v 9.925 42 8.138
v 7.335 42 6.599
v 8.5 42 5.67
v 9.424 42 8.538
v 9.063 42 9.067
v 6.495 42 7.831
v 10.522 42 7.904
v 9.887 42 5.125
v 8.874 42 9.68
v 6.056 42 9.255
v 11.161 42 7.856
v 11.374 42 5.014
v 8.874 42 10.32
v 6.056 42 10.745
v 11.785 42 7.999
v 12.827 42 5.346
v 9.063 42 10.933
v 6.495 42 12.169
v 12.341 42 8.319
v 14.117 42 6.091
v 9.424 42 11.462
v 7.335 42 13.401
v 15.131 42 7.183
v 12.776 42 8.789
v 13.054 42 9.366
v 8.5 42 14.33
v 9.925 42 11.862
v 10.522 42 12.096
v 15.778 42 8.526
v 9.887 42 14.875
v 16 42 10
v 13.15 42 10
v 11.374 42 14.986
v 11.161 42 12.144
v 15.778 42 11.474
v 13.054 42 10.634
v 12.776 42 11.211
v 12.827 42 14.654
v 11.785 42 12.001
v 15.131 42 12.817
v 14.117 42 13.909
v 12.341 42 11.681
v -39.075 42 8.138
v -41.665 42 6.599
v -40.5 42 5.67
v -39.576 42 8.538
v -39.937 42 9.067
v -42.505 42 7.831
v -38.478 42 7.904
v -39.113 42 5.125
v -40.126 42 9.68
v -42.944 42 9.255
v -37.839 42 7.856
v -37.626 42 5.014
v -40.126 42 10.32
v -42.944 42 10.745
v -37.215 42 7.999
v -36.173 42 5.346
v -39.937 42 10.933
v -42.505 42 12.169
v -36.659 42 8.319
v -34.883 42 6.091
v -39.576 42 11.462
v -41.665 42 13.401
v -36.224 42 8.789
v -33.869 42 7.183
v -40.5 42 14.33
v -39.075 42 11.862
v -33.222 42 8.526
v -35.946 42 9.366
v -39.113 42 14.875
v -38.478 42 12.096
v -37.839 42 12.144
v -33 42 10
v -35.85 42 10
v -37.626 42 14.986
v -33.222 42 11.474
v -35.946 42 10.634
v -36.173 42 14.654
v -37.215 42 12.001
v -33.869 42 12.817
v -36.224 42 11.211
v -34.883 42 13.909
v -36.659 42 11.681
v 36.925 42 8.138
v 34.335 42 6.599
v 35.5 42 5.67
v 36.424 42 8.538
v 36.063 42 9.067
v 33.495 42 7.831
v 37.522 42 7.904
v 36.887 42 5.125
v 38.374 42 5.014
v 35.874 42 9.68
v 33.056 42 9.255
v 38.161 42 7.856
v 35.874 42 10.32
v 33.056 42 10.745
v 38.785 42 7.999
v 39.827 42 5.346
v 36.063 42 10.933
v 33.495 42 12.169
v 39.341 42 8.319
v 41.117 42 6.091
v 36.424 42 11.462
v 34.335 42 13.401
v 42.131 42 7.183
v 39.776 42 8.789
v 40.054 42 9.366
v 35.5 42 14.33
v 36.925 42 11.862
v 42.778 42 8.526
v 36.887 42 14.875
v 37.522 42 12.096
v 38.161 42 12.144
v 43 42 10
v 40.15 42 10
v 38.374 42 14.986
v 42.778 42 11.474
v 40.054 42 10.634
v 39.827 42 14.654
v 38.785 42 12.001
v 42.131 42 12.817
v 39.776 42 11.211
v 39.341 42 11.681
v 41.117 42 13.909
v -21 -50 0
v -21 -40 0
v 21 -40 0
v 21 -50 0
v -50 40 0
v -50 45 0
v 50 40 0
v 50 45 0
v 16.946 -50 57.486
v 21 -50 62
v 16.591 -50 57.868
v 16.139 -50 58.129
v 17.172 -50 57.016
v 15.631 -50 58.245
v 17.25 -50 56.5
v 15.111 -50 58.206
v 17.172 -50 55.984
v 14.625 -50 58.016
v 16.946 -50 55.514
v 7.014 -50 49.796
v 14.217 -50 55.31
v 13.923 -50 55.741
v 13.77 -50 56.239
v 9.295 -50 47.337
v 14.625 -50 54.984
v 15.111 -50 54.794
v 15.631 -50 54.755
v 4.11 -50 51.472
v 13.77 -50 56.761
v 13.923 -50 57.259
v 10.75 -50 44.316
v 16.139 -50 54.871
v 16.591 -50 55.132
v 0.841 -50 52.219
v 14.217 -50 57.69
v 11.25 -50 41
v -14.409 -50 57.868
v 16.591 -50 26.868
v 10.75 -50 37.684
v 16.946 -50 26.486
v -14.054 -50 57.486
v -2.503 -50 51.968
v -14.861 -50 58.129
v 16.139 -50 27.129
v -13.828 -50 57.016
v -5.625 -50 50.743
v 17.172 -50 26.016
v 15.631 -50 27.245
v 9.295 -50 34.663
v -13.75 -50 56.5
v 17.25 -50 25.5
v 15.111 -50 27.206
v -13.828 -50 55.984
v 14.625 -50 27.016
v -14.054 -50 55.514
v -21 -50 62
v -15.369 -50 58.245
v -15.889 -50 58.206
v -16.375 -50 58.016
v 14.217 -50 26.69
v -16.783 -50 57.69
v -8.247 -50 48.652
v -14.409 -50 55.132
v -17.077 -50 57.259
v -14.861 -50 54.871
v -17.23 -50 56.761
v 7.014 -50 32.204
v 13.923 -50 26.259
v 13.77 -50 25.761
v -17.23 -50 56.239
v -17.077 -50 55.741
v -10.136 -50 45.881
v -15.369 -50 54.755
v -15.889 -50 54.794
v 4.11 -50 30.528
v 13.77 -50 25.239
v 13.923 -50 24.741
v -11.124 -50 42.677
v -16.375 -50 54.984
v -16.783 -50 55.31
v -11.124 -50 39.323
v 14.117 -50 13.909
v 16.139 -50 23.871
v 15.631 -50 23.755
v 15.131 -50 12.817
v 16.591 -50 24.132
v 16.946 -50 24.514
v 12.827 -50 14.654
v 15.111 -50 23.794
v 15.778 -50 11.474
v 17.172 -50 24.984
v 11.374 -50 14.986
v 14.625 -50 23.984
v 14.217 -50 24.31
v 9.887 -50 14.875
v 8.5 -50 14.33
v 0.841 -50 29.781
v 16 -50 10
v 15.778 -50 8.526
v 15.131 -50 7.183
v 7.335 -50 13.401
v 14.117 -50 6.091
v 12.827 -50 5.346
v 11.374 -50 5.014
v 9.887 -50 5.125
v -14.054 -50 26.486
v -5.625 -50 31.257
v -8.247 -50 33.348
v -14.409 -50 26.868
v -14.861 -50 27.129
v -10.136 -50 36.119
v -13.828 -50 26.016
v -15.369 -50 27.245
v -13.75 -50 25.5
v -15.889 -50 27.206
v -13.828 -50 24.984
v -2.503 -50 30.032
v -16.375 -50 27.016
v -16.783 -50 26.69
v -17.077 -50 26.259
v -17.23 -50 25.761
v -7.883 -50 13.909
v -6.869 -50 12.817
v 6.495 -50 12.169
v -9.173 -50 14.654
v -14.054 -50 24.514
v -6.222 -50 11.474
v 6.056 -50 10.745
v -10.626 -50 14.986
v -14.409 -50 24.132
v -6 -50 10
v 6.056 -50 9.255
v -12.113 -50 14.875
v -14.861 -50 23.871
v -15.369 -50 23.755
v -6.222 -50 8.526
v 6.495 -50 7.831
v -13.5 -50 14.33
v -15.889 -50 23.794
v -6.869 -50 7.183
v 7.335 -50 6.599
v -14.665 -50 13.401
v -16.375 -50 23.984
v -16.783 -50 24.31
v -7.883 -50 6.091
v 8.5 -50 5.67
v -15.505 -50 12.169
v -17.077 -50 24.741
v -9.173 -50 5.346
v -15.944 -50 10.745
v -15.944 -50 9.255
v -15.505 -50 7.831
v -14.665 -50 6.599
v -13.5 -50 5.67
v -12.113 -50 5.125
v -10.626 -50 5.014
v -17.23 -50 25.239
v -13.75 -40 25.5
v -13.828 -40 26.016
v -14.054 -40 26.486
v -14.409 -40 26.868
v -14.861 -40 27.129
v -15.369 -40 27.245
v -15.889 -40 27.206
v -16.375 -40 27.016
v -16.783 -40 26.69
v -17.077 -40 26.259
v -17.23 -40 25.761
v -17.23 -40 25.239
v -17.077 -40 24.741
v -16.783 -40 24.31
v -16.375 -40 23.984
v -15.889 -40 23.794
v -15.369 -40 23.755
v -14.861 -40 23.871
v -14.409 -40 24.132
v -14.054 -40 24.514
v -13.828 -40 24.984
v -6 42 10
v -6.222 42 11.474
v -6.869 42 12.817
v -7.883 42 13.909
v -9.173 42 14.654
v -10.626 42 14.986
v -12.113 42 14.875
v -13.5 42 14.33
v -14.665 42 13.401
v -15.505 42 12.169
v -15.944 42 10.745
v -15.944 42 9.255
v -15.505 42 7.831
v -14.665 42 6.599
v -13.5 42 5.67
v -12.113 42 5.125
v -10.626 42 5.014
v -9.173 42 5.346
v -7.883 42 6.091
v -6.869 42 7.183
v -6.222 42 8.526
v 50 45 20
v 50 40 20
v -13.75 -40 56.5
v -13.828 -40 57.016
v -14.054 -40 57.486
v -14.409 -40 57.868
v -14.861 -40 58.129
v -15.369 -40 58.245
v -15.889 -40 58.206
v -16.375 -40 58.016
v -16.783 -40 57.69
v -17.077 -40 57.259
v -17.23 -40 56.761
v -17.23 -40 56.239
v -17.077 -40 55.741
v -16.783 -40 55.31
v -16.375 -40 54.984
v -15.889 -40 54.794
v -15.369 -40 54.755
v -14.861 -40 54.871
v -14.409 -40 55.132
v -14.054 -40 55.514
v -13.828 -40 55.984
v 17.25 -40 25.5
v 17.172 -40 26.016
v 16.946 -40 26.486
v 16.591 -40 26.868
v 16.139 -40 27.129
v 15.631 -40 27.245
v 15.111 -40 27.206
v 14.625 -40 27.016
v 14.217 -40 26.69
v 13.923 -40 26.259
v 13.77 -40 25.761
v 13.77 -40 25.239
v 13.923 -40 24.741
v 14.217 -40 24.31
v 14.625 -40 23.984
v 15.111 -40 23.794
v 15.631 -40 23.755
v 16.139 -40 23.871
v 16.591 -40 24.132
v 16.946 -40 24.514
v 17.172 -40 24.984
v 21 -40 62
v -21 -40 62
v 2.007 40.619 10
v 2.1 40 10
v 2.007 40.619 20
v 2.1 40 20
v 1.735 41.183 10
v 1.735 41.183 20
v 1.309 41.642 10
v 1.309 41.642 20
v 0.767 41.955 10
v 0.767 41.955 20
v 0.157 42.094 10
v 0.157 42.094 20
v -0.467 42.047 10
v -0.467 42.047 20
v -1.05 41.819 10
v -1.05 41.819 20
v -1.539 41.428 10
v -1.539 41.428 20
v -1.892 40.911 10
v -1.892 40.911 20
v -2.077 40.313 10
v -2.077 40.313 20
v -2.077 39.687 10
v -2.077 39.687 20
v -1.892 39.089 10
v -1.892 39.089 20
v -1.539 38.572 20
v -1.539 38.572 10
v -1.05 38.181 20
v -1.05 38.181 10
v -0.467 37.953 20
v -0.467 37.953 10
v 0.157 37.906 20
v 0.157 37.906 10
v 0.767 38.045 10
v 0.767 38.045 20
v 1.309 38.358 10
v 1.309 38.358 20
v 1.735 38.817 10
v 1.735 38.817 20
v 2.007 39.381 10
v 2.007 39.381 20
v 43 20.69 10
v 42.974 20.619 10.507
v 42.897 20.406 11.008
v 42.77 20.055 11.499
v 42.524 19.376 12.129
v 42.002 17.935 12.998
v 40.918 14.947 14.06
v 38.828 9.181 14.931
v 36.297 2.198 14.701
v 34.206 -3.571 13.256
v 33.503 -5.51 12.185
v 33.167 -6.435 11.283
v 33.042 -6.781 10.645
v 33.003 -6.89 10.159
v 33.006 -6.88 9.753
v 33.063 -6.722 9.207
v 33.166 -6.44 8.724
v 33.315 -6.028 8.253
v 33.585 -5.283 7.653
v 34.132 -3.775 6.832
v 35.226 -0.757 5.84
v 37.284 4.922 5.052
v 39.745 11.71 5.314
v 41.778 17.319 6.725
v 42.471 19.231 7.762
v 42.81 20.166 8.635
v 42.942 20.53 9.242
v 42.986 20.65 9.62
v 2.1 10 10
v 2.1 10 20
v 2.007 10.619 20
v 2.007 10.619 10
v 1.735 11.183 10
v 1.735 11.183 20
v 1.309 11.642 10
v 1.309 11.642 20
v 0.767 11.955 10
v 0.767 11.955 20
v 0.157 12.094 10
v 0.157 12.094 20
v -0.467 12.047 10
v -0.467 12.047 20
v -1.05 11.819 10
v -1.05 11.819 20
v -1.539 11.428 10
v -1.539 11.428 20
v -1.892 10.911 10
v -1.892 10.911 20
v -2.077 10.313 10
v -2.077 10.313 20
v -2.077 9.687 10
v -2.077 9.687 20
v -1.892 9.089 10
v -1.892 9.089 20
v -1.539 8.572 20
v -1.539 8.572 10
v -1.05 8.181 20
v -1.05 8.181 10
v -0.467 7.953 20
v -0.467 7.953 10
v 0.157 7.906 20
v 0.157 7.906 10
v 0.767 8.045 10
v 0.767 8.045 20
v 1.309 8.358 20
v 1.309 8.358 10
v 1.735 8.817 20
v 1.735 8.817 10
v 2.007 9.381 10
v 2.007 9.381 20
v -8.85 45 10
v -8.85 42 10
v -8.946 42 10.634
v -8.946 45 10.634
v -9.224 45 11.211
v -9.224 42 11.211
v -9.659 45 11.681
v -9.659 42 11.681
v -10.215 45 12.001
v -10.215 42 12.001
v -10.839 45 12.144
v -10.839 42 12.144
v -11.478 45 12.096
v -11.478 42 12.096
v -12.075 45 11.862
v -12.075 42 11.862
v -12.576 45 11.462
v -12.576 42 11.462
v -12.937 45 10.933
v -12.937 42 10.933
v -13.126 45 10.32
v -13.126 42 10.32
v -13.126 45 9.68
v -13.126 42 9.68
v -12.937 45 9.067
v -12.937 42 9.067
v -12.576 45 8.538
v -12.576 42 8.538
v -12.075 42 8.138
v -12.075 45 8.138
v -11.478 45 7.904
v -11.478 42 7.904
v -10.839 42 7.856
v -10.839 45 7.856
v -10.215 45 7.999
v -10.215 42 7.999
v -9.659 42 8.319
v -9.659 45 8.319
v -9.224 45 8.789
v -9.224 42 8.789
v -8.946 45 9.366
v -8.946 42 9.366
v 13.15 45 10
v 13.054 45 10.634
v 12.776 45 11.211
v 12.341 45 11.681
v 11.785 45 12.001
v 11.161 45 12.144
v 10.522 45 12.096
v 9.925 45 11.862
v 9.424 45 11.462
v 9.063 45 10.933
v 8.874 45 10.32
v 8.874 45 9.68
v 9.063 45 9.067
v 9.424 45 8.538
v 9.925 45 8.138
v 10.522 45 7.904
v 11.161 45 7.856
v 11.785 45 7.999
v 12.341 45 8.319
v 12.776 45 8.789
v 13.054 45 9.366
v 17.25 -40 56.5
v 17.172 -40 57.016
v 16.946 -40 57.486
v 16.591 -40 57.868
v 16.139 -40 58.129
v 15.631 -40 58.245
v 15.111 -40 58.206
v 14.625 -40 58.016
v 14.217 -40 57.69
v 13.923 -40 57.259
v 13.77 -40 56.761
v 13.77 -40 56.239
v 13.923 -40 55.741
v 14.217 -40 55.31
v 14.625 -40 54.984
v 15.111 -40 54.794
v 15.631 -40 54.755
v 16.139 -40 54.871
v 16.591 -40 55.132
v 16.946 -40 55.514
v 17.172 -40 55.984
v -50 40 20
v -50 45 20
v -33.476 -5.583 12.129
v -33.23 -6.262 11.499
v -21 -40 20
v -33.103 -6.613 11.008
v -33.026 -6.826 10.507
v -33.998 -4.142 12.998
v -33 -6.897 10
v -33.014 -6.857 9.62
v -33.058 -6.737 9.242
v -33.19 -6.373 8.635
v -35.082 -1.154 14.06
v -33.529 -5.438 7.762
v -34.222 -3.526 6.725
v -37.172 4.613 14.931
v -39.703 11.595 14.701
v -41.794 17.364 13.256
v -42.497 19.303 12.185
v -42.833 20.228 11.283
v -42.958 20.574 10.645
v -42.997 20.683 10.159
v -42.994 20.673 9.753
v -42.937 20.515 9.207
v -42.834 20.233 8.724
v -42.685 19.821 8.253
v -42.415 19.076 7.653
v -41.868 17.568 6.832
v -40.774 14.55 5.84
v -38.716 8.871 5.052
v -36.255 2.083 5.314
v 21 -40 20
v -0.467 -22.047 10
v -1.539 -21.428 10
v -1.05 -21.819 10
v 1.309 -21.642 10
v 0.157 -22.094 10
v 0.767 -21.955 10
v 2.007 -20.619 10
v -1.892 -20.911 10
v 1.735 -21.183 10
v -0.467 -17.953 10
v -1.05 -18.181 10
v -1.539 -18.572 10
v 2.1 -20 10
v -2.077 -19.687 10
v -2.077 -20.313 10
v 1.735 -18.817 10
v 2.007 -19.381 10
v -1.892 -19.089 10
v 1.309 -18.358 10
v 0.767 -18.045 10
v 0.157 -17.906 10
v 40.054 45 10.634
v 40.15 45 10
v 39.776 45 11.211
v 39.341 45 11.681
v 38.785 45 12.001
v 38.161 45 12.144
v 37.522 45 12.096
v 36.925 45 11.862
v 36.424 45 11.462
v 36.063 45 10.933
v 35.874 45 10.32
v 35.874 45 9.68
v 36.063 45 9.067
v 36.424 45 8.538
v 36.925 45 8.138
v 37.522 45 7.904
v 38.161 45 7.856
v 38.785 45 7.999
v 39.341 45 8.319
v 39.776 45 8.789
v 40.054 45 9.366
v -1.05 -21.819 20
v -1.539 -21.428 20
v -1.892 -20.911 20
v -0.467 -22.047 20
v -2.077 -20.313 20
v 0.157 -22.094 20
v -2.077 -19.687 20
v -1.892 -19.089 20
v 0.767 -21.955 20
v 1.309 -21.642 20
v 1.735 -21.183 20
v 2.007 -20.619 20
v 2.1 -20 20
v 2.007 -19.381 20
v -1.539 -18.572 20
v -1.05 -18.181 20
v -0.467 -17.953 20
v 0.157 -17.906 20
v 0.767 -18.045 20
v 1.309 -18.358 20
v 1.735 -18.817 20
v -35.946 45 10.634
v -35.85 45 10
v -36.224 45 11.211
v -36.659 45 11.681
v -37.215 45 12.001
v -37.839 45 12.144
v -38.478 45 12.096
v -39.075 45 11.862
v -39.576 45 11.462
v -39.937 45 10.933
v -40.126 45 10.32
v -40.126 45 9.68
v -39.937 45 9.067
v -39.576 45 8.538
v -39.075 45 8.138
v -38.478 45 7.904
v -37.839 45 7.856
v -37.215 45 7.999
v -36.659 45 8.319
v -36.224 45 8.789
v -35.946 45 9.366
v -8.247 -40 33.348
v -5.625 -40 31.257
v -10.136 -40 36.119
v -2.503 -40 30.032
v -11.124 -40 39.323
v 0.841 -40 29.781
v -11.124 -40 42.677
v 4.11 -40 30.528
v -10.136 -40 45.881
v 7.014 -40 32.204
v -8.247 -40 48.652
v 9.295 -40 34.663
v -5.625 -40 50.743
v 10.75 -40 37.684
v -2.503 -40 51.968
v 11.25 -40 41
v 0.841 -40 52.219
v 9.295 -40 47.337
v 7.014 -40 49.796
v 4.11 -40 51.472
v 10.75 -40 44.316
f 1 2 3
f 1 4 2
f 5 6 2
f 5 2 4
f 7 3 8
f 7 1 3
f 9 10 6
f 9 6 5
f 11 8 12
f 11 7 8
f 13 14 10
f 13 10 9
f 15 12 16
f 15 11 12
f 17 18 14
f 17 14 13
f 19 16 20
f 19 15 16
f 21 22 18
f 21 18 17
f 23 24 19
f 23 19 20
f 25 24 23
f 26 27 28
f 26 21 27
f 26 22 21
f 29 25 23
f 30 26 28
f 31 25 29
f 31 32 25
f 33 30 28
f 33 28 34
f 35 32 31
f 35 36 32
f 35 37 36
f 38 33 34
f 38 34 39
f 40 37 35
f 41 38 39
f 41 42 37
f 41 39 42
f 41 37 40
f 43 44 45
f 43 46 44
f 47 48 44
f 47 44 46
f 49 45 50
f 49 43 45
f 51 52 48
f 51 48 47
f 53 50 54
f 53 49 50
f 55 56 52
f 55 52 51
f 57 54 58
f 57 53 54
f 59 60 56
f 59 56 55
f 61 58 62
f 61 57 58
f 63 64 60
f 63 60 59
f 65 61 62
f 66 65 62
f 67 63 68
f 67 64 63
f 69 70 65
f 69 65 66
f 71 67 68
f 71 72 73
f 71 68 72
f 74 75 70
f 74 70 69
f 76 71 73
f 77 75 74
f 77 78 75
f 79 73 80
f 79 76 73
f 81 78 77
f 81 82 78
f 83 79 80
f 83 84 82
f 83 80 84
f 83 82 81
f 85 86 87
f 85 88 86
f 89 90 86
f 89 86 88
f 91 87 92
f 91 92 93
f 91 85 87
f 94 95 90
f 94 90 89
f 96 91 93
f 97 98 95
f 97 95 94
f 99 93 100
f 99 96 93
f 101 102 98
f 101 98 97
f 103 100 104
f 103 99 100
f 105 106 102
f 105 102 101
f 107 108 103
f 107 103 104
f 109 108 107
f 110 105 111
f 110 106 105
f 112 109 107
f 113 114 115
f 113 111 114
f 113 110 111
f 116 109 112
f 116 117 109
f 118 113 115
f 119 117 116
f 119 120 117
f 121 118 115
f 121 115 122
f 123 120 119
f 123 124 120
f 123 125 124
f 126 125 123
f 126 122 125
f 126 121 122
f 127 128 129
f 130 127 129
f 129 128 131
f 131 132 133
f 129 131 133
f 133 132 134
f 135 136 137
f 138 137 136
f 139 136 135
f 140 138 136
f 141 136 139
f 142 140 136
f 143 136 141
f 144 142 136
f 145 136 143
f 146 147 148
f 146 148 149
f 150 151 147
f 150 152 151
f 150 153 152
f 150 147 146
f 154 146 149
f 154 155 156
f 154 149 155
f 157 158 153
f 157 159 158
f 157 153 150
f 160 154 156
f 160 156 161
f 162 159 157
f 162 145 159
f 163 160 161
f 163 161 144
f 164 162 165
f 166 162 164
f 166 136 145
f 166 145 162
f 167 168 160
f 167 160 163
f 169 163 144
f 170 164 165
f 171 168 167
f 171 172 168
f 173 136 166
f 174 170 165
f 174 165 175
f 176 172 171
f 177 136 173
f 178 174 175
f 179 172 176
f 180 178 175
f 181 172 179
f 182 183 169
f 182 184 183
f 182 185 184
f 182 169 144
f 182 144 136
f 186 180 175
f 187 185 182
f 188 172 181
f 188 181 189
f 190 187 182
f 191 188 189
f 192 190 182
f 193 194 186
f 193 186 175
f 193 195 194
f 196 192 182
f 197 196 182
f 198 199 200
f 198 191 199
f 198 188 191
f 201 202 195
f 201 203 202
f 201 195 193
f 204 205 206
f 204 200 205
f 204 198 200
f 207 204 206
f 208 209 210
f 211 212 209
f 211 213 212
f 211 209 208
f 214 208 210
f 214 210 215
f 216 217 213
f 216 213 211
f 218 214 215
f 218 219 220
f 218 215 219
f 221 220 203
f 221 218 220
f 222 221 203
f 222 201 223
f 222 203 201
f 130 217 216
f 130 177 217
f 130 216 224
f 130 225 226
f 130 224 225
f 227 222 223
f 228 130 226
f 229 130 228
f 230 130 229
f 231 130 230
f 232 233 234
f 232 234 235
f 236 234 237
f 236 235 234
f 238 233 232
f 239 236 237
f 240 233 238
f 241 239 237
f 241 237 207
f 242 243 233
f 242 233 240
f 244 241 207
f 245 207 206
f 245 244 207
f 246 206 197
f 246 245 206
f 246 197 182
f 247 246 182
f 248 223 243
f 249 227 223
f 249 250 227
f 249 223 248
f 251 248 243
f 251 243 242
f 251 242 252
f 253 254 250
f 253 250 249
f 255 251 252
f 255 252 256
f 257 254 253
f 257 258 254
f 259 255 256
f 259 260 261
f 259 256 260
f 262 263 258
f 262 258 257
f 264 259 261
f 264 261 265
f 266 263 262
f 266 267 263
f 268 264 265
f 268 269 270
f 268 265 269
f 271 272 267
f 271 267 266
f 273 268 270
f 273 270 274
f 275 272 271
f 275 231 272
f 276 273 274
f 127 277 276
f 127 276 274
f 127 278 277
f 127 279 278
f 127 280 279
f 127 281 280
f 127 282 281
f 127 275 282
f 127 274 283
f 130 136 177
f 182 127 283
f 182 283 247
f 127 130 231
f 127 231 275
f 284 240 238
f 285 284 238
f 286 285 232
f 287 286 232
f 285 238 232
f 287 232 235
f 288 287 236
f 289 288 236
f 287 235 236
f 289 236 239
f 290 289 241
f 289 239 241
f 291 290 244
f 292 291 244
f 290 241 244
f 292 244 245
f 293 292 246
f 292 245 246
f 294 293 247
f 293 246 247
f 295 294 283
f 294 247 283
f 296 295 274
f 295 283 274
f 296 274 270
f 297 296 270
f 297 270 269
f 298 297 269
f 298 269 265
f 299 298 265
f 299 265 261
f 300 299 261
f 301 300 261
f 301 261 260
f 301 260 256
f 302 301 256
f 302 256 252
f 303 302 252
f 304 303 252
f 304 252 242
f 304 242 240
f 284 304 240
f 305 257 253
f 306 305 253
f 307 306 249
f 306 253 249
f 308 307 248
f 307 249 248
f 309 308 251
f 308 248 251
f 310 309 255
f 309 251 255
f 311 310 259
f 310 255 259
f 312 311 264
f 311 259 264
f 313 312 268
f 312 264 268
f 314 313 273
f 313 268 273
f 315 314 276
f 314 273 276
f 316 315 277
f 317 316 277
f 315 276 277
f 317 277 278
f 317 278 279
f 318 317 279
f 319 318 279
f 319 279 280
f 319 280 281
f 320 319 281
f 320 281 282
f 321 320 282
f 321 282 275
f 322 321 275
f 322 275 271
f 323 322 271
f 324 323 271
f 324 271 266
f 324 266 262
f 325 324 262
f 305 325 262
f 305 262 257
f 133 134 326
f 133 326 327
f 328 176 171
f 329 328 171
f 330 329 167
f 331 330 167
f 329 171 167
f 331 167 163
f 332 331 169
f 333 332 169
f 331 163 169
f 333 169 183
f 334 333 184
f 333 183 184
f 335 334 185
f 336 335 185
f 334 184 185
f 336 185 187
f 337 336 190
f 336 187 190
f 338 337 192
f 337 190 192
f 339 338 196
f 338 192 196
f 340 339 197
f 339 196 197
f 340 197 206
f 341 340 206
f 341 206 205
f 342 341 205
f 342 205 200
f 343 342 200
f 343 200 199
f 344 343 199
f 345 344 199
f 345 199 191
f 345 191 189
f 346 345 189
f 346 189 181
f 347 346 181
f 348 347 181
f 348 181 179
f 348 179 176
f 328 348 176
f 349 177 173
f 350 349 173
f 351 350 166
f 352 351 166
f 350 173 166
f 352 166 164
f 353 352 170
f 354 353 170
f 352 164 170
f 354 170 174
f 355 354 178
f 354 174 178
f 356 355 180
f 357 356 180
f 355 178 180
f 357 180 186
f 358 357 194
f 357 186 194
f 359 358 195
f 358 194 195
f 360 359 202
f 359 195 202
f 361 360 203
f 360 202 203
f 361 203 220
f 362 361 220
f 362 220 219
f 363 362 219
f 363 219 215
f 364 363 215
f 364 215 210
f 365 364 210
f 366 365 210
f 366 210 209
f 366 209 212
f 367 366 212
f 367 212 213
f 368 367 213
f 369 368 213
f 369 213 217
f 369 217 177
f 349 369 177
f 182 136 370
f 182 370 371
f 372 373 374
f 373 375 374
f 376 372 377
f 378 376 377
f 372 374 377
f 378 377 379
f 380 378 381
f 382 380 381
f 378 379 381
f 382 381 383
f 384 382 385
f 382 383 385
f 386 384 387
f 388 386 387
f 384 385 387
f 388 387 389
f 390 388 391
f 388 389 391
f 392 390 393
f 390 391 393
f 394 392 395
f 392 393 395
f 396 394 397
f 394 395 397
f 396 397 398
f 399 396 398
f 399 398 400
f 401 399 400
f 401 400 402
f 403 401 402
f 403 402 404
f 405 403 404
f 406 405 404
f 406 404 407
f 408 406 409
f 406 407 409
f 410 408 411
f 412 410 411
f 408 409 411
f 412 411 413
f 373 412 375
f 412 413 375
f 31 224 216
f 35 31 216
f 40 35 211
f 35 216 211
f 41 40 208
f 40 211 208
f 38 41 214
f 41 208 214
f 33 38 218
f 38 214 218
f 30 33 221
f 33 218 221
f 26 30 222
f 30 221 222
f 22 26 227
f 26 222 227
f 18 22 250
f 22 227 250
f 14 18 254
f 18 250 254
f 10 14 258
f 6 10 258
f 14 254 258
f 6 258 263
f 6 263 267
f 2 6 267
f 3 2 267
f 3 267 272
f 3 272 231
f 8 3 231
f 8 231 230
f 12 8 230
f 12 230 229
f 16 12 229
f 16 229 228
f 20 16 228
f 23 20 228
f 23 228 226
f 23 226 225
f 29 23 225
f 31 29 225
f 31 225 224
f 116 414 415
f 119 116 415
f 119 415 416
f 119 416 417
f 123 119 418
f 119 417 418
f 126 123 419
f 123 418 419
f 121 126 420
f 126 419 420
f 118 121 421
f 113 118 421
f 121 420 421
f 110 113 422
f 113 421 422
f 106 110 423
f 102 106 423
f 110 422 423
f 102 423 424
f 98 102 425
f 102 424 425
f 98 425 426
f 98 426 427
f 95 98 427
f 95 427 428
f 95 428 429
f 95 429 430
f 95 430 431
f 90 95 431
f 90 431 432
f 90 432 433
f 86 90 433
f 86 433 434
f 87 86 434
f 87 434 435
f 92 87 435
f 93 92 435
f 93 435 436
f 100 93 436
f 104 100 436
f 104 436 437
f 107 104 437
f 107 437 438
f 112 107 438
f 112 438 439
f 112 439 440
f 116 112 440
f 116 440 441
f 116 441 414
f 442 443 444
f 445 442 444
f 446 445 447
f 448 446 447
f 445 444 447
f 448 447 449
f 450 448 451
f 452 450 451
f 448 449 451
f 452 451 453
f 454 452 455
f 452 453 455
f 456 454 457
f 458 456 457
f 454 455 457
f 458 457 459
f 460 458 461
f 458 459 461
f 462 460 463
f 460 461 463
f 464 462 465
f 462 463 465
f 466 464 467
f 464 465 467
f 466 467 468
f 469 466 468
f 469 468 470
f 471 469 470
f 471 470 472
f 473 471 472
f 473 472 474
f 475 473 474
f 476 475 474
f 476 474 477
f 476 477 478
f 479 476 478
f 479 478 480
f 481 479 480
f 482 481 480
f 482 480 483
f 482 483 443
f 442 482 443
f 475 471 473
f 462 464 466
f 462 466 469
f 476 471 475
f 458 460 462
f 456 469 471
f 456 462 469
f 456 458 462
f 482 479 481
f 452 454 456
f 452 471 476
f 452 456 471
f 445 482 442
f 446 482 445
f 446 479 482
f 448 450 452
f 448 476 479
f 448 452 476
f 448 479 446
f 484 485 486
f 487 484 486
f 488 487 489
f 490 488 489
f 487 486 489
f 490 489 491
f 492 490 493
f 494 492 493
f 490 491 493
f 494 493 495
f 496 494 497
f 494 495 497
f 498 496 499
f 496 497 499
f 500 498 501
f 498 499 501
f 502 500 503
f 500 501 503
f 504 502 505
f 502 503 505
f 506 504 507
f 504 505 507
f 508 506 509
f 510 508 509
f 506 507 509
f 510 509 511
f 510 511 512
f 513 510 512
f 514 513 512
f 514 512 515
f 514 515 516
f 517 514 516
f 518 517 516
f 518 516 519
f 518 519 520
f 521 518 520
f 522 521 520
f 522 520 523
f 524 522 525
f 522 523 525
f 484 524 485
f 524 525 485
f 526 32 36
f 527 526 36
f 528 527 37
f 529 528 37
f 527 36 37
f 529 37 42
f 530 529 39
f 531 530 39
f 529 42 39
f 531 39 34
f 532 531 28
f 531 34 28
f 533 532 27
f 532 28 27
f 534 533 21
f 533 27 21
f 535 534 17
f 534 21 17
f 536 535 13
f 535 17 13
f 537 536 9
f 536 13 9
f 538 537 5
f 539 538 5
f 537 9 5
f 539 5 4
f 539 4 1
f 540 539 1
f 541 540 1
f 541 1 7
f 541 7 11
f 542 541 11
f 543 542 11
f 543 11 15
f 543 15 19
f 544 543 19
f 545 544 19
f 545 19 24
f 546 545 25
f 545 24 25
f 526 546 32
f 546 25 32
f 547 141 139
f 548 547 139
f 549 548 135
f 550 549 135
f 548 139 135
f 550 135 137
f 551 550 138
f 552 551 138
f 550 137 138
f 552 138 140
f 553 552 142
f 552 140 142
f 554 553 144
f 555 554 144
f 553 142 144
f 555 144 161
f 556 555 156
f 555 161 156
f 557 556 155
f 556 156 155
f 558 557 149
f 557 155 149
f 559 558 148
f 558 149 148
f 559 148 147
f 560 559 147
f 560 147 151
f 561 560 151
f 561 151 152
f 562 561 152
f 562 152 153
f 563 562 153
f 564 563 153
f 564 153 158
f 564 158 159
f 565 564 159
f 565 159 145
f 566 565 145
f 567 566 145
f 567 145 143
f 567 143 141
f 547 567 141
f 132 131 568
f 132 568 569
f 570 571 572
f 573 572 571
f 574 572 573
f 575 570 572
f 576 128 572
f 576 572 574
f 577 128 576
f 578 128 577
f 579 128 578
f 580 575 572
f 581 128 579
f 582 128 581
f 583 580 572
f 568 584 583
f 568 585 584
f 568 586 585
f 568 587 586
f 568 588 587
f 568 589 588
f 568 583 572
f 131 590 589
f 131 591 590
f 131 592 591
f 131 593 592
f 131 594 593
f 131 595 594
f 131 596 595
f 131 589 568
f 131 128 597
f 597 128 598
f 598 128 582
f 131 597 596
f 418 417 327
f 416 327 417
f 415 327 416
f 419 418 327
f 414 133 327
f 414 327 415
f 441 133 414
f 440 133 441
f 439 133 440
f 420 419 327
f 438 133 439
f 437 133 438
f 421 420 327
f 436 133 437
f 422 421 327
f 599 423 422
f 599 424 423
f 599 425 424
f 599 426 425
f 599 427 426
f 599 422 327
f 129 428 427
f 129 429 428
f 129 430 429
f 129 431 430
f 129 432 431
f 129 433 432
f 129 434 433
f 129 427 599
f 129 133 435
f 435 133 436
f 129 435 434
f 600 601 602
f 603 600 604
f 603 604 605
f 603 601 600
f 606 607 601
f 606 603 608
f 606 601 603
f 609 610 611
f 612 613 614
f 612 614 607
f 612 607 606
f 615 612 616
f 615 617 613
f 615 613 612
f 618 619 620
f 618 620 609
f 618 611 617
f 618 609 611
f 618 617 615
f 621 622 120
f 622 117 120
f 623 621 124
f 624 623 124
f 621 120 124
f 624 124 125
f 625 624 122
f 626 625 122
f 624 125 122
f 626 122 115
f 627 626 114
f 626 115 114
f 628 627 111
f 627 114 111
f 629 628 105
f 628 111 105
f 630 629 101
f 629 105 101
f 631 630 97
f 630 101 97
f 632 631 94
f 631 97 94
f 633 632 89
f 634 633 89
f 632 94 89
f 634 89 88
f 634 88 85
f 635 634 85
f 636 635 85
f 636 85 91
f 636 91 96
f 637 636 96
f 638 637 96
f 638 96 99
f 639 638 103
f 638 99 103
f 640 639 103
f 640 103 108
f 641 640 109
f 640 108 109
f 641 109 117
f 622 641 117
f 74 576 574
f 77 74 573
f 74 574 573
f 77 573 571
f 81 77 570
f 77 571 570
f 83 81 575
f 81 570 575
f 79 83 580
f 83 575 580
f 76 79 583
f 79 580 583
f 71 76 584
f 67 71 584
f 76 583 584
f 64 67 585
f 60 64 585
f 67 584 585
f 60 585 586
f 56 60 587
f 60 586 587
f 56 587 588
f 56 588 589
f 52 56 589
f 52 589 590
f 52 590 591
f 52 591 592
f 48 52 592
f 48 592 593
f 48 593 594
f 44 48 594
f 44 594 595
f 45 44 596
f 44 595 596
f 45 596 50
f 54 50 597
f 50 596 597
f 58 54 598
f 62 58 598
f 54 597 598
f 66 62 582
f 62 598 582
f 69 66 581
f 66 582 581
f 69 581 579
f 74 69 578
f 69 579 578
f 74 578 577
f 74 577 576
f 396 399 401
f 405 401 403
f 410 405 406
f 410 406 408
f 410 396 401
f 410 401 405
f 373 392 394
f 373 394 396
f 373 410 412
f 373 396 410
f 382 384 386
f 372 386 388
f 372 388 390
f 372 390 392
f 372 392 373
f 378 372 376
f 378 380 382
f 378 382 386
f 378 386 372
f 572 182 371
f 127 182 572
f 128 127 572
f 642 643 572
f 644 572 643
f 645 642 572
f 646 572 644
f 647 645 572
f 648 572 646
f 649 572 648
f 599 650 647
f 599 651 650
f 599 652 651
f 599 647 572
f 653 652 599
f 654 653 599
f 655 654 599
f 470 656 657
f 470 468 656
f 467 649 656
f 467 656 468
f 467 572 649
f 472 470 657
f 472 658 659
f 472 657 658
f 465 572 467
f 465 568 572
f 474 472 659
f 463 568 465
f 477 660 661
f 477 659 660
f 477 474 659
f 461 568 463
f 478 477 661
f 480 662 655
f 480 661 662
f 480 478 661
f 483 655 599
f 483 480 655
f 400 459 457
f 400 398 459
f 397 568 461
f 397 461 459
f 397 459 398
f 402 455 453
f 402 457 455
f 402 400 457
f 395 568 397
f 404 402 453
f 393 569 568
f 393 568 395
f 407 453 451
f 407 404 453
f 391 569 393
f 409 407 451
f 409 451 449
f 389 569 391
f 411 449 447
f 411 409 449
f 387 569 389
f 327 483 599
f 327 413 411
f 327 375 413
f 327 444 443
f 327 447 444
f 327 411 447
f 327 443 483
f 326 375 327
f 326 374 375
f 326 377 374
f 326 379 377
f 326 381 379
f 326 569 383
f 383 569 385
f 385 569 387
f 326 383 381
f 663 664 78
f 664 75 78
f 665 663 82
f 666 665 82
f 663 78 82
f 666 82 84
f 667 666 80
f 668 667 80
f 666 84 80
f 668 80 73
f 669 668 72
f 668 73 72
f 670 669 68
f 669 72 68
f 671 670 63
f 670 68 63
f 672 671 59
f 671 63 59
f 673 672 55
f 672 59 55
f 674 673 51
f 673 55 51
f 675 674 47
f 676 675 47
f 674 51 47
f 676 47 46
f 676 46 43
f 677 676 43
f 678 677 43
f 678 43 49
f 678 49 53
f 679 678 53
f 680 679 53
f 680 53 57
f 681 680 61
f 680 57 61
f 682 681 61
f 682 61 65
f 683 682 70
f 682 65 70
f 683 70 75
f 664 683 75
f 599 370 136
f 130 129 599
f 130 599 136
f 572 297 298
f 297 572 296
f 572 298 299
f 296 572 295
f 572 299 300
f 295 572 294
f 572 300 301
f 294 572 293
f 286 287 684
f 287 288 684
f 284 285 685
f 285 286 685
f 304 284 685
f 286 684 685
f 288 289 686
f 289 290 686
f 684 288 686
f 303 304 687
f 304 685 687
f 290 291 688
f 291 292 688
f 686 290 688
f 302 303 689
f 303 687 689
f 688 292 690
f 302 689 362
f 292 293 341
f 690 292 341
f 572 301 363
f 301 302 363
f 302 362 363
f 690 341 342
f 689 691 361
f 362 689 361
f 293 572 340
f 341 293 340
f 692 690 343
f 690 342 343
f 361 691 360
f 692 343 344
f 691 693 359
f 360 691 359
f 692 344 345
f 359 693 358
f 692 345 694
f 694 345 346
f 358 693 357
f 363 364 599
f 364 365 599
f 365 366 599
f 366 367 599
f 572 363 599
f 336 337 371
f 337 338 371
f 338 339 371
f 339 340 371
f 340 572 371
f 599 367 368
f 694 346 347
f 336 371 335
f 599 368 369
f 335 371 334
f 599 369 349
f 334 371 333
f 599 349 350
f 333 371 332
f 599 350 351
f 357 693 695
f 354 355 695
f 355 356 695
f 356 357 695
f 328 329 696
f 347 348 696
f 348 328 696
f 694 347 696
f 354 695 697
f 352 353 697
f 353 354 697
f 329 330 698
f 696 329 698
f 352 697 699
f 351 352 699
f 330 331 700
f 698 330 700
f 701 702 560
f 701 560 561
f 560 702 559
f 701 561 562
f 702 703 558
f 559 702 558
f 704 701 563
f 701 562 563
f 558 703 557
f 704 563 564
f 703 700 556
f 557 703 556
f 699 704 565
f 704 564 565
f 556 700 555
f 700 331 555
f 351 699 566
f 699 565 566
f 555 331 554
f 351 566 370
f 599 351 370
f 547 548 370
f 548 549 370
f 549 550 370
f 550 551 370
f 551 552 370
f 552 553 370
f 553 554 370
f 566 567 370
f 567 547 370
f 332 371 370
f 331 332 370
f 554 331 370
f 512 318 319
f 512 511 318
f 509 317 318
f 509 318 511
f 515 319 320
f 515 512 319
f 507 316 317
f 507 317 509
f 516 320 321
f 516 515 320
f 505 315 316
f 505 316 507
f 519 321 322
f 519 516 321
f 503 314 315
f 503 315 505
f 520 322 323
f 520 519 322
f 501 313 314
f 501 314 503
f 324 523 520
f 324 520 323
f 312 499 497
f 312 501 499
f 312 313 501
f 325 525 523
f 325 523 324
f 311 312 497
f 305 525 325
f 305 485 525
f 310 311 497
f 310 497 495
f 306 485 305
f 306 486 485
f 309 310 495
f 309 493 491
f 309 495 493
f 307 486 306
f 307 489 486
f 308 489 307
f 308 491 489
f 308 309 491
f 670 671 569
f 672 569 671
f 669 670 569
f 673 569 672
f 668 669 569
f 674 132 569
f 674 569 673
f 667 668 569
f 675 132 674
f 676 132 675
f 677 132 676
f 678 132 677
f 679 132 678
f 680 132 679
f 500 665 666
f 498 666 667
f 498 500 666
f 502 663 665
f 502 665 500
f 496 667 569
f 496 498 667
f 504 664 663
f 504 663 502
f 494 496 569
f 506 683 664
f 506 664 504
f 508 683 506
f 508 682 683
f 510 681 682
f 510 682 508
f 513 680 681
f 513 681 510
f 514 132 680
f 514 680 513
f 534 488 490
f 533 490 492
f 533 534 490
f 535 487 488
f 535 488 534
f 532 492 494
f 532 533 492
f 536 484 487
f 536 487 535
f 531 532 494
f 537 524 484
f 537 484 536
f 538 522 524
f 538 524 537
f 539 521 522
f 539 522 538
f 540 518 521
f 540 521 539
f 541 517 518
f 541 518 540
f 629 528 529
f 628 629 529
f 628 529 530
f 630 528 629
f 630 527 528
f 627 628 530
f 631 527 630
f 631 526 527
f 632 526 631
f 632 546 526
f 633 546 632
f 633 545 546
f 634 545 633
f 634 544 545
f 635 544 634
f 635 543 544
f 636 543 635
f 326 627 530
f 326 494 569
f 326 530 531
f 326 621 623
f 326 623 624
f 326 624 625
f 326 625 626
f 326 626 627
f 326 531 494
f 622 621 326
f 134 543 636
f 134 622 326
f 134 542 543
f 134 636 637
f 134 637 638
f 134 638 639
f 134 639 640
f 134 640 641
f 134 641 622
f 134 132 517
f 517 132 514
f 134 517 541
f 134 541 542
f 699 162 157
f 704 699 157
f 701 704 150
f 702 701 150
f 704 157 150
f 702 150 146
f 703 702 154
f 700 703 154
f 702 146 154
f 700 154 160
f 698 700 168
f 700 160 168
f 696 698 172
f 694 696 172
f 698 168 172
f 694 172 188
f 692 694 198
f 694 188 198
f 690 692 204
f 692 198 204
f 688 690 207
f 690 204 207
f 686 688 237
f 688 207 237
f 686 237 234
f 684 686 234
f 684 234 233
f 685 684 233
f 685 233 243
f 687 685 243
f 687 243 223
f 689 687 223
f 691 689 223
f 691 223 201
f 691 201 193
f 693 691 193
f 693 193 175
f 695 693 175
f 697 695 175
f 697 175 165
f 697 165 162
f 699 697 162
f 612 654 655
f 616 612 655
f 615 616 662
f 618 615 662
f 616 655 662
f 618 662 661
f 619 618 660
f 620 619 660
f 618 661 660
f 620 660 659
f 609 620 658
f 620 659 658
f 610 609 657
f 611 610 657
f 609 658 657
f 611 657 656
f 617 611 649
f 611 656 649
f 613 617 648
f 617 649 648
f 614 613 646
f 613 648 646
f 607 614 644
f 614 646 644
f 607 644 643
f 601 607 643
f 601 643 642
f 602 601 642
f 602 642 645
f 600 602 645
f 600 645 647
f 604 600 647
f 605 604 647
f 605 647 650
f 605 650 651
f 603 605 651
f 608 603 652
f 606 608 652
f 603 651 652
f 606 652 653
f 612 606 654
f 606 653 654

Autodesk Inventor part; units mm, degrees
ref_plane "YZ Plane" through (0, 0, 0) normal (1, 0, 0) x (0, 1, 0)
ref_plane "XZ Plane" through (0, 0, 0) normal (0, 1, 0) x (-1, 0, 0)
ref_plane "XY Plane" through (0, 0, 0) normal (0, 0, 1) x (1, 0, 0)
sketch "Sketch1" plane through (0, 0, 0) normal (0, 0, 1) x (1, 0, 0)
  line L0 (-50, 45) -> (50, 45)
  line L1 (50, 45) -> (50, 40)
  line L2 (50, 40) -> (21, -40)
  line L3 (21, -40) -> (21, -50)
  line L4 (21, -50) -> (-21, -50)
  line L5 (-21, -50) -> (-21, -40)
  line L6 (-21, -40) -> (-50, 40)
  line L7 (-50, 40) -> (-50, 45)
  point P0 (0, 0)
  point P1 (0, -50)
  point P2 (0, 45)
  point P3 (-35.5, 0)
  dimension "d0" = 42
  dimension "d1" = 10
  dimension "d2" = 5
  dimension "d3" = 95
  dimension "d4" = 100
extrude "Extrusion1" add sketch "Sketch1" along normal blind 20
sketch "Sketch2" plane through (-21, -50, 0) normal (0, -1, 0) x (1, 0, 0)
  line L0 (0, 20) -> (42, 20) projected
  line L1 (0, 0) -> (0, 20) projected
  line L2 (0, 20) -> (42, 20)
  line L3 (42, 20) -> (42, 62)
  line L4 (42, 62) -> (0, 62)
  line L5 (0, 62) -> (0, 20)
  circle A0 centre (21, 41) radius 11.25
  circle A1 centre (5.5, 56.5) radius 1.75
  circle A2 centre (5.5, 25.5) radius 1.75
  circle A3 centre (36.5, 25.5) radius 1.75
  circle A4 centre (36.5, 56.5) radius 1.75
  point P0 (21, 0)
  point P1 (21, 62)
  point P2 (0, 41)
  dimension "d7" = 22.5
  dimension "d8" = 31
  dimension "d9" = 31
  dimension "d10" = 15.5
  dimension "d11" = 15.5
  dimension "d12" = 3.5
extrude "Extrusion2" add sketch "Sketch2" against normal blind 10
sketch "Sketch3" plane through (-21, -50, 0) normal (0, -1, 0) x (1, 0, 0)
  line L0 (71, 0) -> (-29, 0) projected
  line L1 (-29, 0) -> (-29, 20) projected
  line L2 (71, 20) -> (-29, 20) projected
  line L3 (71, 0) -> (71, 20) projected
  circle A0 centre (-17, 10) radius 5
  circle A1 centre (-17, 10) radius 2.15
  circle A2 centre (59, 10) radius 5
  circle A3 centre (59, 10) radius 2.15
  circle A4 centre (10, 10) radius 5
  circle A5 centre (32, 10) radius 5
  circle A6 centre (32, 10) radius 2.15
  circle A7 centre (10, 10) radius 2.15
  line L4 (0, 0) -> (0, 62) projected
  line L5 (42, 0) -> (42, 62) projected
  point P0 (21, 0)
  point P1 (-29, 10)
  dimension "d15" = 12
  dimension "d16" = 4.3
  dimension "d17" = 10
  dimension "d18" = 12
  dimension "d19" = 10
  dimension "d20" = 10
extrude "Extrusion3" cut sketch "Sketch3" against normal blind 92 contours A0 | A1 | A2 | A3 | A4 | A5 | A6 | A7
extrude "Extrusion5" cut sketch "Sketch3" against normal through all contours A1 | A3 | A6 | A7
sketch "Sketch4" plane through (0, 0, 20) normal (0, 0, 1) x (1, 0, 0)
  circle A0 centre (0, 40) radius 2.1
  circle A1 centre (0, 10) radius 2.1
  circle A2 centre (0, -20) radius 2.1
  line L0 (50, 45) -> (-50, 45) projected
  point P0 (0, 0)
  dimension "d23" = 5
  dimension "d24" = 30
  dimension "d25" = 30
  dimension "d26" = 4.2
extrude "Extrusion4" cut sketch "Sketch4" against normal blind 10
equation "\"d9\" = d8"
equation "\"d10\" = 0.5 * d8"
equation "\"d11\" = 0.5 * d9"
equation "\"d18\" = d15"
equation "\"d20\" = d19"
properties part number "SliderMotorHalter"
